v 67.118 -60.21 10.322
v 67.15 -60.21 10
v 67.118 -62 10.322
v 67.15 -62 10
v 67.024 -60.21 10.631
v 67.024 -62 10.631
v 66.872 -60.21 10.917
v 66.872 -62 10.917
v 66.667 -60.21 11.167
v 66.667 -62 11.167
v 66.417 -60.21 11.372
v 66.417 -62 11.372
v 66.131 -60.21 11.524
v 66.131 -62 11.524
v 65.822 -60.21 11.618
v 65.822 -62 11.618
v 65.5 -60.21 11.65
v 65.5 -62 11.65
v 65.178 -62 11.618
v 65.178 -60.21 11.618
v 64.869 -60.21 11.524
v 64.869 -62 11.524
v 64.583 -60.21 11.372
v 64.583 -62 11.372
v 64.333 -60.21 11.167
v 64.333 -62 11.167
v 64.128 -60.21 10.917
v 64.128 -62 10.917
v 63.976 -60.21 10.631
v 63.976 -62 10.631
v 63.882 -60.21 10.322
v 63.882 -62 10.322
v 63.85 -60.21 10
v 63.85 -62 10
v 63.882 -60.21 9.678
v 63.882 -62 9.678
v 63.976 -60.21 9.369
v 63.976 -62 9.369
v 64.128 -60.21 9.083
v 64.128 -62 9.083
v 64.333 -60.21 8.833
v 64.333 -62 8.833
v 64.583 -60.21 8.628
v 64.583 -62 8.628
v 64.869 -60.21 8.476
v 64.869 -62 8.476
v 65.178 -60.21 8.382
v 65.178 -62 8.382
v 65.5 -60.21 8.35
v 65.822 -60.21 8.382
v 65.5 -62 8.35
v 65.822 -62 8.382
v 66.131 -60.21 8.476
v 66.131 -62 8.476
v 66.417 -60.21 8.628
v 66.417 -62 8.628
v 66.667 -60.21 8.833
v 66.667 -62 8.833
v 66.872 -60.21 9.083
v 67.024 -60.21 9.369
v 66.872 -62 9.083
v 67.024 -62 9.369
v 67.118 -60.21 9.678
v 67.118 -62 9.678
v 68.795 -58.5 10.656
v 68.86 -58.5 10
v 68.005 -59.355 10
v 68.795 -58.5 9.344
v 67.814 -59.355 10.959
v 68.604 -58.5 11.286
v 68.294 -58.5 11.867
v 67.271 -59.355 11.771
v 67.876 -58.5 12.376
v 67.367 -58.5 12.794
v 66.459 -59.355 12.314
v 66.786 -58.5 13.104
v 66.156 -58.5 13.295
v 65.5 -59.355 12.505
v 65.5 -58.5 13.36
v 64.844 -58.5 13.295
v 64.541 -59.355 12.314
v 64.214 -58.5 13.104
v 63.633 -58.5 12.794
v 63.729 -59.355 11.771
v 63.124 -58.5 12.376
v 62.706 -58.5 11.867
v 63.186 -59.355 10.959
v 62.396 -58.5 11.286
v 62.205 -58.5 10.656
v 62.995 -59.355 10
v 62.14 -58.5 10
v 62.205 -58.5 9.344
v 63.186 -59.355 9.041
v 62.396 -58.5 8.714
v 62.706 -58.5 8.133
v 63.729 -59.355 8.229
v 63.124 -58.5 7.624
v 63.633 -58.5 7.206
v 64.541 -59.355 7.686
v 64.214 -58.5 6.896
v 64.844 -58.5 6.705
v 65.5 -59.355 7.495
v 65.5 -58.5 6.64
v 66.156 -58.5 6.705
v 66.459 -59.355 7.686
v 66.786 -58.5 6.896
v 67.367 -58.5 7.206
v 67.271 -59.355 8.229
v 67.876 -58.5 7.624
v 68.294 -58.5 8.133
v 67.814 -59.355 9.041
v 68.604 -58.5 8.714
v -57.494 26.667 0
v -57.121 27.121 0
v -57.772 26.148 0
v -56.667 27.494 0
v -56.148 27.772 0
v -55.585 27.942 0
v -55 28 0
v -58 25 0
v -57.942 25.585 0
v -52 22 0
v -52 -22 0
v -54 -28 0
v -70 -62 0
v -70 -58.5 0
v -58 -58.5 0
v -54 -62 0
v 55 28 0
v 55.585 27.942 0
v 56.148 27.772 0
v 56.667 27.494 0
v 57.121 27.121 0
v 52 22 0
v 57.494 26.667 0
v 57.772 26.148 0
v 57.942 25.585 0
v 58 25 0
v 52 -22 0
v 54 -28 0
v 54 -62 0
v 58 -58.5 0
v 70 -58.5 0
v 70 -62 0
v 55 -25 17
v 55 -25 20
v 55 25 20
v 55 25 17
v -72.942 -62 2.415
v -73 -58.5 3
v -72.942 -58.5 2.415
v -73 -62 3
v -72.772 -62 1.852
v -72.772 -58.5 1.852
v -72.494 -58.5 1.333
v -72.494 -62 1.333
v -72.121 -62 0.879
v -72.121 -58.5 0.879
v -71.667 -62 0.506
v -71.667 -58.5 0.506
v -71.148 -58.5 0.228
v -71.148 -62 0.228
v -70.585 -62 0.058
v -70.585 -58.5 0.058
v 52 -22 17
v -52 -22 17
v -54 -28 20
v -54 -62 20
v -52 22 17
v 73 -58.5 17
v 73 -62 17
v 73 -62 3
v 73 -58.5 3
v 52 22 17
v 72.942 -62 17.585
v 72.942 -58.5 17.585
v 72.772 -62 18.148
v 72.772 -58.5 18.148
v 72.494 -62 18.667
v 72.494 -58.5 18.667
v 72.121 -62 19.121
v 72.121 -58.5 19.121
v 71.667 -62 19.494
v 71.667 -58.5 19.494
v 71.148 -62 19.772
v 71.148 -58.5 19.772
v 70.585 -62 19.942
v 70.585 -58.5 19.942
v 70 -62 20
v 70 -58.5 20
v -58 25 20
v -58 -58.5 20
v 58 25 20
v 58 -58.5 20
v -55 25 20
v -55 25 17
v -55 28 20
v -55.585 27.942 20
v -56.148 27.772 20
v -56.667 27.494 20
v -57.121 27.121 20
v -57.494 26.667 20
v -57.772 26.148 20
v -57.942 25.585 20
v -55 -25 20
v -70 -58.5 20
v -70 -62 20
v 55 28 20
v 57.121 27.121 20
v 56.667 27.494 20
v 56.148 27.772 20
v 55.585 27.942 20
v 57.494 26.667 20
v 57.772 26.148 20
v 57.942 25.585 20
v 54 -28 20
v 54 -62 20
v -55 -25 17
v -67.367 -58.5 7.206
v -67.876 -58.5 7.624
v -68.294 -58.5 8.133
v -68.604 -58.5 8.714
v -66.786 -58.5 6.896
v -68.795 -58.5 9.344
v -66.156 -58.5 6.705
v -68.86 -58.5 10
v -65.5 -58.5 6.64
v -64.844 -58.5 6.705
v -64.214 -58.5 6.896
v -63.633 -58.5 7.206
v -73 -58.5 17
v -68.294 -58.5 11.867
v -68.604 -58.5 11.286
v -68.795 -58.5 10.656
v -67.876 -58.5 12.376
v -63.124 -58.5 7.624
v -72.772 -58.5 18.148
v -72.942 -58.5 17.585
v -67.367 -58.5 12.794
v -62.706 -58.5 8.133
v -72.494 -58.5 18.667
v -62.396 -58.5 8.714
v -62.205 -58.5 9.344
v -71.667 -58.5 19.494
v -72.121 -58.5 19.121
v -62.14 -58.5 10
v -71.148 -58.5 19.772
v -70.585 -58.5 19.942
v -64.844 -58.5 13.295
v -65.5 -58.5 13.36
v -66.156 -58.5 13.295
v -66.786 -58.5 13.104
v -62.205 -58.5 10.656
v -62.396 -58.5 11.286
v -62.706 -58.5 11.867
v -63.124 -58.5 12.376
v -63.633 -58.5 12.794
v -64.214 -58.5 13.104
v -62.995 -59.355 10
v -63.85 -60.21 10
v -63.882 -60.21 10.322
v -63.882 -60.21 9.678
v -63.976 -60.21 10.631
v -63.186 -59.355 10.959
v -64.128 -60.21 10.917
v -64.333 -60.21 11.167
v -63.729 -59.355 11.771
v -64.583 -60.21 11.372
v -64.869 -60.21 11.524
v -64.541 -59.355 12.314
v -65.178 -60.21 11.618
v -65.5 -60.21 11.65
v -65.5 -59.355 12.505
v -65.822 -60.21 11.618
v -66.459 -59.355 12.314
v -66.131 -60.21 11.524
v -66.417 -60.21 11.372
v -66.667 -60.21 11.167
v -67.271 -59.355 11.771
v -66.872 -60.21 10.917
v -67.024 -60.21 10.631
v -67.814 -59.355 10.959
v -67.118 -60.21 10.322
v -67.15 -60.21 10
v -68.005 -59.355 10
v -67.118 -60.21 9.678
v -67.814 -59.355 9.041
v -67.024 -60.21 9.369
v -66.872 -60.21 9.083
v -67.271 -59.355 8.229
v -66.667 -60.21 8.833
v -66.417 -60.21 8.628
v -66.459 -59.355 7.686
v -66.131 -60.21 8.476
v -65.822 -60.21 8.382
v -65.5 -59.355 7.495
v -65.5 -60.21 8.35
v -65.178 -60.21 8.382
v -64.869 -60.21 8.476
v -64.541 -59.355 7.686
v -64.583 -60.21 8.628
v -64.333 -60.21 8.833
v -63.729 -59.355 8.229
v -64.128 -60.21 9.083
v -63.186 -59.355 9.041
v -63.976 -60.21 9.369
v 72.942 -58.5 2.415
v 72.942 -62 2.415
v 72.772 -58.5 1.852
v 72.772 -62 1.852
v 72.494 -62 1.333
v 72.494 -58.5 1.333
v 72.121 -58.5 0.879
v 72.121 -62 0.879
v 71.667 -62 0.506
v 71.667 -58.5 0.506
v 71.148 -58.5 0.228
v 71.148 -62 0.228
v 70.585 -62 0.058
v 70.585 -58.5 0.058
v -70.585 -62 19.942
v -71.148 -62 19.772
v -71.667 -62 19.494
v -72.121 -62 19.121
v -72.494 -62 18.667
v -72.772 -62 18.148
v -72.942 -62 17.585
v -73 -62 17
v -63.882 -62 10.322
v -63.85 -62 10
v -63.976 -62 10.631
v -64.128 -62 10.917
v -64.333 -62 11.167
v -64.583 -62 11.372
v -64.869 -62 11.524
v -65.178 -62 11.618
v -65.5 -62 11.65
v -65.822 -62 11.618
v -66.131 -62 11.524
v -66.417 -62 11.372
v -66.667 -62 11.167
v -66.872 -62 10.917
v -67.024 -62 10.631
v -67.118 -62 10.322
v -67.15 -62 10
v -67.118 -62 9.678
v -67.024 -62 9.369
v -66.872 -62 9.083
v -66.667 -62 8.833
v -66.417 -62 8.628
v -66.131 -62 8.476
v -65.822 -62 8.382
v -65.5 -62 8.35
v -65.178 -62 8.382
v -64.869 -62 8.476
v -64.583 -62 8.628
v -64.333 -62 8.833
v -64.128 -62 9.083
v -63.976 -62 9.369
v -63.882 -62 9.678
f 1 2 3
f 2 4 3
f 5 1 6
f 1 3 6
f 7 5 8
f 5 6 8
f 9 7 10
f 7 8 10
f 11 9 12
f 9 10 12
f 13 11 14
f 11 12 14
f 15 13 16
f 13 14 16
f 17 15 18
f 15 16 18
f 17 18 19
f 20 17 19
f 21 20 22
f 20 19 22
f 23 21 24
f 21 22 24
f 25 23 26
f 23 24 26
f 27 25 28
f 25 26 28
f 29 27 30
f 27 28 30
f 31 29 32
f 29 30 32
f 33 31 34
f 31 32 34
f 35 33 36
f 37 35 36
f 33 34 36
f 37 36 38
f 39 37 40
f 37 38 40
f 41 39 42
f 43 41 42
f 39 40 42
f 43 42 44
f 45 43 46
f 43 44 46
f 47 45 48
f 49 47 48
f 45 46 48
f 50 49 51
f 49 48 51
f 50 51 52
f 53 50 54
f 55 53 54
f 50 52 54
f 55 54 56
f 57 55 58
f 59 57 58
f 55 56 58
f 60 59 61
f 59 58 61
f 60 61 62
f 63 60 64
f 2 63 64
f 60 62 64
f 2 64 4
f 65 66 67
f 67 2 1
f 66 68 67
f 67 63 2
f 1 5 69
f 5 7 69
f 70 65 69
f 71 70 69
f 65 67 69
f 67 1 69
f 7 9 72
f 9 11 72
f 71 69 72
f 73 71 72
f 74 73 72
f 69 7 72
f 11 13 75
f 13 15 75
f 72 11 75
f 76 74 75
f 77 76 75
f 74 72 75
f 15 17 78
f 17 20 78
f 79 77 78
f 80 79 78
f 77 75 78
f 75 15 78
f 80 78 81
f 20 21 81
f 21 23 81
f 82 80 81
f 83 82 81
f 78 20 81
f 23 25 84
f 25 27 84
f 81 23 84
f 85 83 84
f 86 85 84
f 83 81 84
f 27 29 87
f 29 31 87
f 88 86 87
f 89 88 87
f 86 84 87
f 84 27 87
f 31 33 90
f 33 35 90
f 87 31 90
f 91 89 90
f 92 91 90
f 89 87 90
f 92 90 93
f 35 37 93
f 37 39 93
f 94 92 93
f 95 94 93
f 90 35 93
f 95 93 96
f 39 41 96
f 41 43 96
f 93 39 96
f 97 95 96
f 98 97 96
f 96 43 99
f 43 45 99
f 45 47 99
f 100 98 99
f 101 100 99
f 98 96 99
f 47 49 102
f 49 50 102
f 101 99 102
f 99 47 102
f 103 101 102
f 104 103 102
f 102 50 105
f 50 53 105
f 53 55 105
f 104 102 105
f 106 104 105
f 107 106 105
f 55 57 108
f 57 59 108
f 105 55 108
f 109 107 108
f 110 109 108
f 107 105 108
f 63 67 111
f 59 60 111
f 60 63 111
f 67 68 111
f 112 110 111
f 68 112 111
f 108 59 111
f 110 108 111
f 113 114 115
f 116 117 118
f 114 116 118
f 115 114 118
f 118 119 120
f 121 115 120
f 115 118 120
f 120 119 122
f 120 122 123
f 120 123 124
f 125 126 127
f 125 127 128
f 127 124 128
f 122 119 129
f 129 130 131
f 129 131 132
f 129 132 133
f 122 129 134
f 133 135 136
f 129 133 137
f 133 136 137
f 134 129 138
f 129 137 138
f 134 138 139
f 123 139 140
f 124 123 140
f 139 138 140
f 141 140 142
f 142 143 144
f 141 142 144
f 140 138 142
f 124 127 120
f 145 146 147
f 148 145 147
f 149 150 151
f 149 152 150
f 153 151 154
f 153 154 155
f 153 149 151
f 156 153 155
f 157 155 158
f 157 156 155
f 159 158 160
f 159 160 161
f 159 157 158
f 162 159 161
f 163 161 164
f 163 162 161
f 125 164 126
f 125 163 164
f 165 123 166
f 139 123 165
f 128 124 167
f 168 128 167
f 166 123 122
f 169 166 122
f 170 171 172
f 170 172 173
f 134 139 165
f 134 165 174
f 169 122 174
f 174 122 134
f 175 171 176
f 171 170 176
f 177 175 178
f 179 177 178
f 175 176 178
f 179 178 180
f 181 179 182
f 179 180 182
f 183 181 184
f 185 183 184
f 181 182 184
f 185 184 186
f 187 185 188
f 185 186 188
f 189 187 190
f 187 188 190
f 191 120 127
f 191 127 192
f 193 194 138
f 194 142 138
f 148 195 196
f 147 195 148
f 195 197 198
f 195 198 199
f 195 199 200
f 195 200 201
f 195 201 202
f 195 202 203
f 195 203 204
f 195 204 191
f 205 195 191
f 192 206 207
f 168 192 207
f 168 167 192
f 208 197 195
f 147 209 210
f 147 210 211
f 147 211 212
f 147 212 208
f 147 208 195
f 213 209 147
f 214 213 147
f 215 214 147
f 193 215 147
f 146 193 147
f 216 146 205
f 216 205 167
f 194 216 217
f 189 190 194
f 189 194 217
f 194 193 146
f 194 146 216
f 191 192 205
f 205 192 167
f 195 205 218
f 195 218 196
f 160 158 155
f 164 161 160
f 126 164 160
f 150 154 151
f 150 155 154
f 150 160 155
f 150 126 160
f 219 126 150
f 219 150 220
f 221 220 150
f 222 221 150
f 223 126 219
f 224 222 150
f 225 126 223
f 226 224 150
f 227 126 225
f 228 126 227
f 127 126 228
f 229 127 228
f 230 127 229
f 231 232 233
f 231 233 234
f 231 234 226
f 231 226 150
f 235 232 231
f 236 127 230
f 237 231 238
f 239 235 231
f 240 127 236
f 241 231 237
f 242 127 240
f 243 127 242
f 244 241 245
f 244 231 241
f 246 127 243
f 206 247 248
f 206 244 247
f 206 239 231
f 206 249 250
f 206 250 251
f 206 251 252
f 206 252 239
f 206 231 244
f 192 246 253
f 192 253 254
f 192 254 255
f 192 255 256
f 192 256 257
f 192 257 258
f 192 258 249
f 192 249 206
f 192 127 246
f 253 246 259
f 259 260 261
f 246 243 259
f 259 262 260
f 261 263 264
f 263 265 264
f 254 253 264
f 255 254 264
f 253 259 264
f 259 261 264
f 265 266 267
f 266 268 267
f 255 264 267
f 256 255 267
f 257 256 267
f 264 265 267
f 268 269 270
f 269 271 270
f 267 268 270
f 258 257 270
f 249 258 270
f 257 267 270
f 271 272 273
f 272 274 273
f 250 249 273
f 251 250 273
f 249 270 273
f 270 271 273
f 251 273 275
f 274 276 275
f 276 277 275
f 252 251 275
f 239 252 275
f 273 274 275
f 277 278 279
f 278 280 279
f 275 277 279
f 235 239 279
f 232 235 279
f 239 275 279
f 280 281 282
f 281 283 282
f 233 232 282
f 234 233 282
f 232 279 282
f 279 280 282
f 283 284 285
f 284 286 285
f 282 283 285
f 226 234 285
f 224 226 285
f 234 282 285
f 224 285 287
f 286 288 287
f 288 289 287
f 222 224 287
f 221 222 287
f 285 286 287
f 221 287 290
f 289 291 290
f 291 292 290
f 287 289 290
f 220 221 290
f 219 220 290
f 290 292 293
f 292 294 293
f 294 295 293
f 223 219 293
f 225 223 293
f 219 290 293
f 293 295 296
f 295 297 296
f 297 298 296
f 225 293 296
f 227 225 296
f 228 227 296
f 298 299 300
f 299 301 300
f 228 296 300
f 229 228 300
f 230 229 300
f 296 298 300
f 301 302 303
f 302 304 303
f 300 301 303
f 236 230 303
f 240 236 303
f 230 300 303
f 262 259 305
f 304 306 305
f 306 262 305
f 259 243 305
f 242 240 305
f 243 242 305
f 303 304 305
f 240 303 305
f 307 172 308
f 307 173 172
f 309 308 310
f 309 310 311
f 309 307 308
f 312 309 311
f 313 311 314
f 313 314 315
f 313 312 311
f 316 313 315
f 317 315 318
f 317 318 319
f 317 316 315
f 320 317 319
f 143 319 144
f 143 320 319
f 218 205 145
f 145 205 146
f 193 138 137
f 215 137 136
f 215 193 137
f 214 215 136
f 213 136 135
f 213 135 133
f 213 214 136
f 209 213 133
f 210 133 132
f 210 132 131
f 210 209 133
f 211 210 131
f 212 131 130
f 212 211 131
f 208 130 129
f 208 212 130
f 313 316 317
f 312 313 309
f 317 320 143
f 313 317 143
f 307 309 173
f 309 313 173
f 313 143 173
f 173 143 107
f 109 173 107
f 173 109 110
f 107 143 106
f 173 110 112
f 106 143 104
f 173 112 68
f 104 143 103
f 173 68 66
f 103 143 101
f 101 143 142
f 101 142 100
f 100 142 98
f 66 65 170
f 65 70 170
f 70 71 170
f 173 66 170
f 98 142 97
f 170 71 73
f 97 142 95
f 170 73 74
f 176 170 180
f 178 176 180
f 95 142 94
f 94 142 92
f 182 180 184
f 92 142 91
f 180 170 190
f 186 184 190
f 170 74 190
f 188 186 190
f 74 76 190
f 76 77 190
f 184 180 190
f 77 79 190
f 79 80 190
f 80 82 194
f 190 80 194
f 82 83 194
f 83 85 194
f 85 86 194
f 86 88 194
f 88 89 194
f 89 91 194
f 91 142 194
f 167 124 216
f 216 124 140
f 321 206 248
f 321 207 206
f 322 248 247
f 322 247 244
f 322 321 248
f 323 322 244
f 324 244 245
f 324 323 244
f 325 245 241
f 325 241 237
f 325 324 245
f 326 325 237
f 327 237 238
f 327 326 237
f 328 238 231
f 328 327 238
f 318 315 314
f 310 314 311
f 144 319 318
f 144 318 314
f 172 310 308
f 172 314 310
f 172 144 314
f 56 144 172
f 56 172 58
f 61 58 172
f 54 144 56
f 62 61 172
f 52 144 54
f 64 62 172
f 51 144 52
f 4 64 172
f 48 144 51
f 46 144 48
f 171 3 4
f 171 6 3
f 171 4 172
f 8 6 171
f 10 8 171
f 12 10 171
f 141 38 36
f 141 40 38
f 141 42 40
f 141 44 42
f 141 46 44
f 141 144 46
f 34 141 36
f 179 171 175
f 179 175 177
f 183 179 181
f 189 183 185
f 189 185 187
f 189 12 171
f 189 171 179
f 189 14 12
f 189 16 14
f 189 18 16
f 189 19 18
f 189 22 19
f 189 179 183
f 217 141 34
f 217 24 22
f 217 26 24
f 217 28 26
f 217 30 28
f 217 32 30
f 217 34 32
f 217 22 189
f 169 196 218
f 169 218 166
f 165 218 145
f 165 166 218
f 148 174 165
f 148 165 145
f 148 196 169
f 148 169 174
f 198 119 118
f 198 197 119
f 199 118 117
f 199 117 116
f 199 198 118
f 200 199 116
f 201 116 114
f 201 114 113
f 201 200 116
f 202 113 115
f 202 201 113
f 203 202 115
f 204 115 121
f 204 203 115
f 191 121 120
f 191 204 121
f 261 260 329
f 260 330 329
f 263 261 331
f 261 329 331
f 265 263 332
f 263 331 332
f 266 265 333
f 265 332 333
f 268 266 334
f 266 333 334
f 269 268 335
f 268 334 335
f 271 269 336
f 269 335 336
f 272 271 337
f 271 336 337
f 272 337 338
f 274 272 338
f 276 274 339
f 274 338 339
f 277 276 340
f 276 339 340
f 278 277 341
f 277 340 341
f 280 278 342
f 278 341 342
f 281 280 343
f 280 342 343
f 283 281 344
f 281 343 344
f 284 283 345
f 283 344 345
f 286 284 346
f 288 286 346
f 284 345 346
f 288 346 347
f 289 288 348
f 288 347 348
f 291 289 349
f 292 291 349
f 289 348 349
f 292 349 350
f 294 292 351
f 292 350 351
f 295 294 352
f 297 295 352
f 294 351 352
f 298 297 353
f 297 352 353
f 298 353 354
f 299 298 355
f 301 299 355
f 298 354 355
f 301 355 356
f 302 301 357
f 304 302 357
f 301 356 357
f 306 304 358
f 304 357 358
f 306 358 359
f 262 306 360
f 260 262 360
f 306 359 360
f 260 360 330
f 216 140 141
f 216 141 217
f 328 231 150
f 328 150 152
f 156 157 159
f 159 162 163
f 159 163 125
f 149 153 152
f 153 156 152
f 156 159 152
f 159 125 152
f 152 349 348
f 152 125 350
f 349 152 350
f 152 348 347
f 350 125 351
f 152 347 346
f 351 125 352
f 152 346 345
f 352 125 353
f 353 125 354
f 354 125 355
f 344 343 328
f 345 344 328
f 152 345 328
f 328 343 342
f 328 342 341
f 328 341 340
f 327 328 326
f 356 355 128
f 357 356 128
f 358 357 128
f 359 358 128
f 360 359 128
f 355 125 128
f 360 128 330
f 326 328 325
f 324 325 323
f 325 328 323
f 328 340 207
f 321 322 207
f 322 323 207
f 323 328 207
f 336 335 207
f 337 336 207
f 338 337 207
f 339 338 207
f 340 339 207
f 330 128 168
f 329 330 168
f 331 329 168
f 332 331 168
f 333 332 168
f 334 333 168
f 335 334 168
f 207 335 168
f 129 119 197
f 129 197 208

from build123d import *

# Parameters (mm, degrees)
F0_W            = 116
F0_H            = 56
F0_W_2          = 104
F0_H_2          = 44
F1_DEPTH        = 20
F2_W            = 110
F2_H            = 50
F2_W_2          = 104
F2_H_2          = 44
F3_DEPTH        = 3
F4_W            = 4
F4_H            = 20
F5_DEPTH        = 34
F6_W            = 3.5
F6_H            = 20
F7_DEPTH        = 15
F8_W            = 3.5
F8_H            = 20
F9_DEPTH        = 15
F11_D           = 3.3
F11_DEPTH       = 5
F11_CSINK_D     = 6.72
F11_CSINK_ANGLE = 90
F11_TIP         = 0.9914200214
F13_D           = 3.3
F13_DEPTH       = 5
F13_CSINK_D     = 6.72
F13_CSINK_ANGLE = 90
F13_TIP         = 0.9914200214
F14_R           = 3


with BuildPart() as f1:
    # F0 (on Top) → F1 (new body)
    with BuildSketch(Plane.XY):
        Rectangle(F0_W, F0_H)
        Rectangle(F0_W_2, F0_H_2, mode=Mode.SUBTRACT)
    extrude(amount=F1_DEPTH)

    # F2 (on face) → F3 (cut)
    with BuildSketch(Plane.XY.offset(20)):
        Rectangle(F2_W, F2_H)
        Rectangle(F2_W_2, F2_H_2, mode=Mode.SUBTRACT)
    extrude(amount=-F3_DEPTH, mode=Mode.SUBTRACT)

    # F4 (on face) → F5 (join)
    with BuildSketch(Plane.XZ.offset(28)):
        with Locations((-56, 10)):
            Rectangle(F4_W, F4_H)
        with Locations((56, 10)):
            Rectangle(F4_W, F4_H)
    extrude(amount=F5_DEPTH)

    # F6 (on face) → F7 (join)
    with BuildSketch(Plane.YZ.offset(58)):
        with Locations((-60.25, 10)):
            Rectangle(F6_W, F6_H)
    extrude(amount=F7_DEPTH)

    # F8 (on face) → F9 (join)
    with BuildSketch(Plane(origin=(-58, 0, 0), x_dir=(0, -1, 0), z_dir=(-1, 0, 0))):
        with Locations((60.25, 10)):
            Rectangle(F8_W, F8_H)
    extrude(amount=F9_DEPTH)

    # F11
    with Locations(Plane(origin=(0, -58.5, 0), x_dir=(-1, 0, 0), z_dir=(0, 1, 0))):
        with Locations((-65.5, 10)):
            CounterSinkHole(F11_D / 2, F11_CSINK_D / 2, depth=F11_DEPTH, counter_sink_angle=F11_CSINK_ANGLE)
            with Locations((0, 0, -(F11_DEPTH + F11_TIP / 2))):  # 118° drill point
                Cone(0, F11_D / 2, F11_TIP, mode=Mode.SUBTRACT)

    # F13
    with Locations(Plane(origin=(0, -58.5, 0), x_dir=(-1, 0, 0), z_dir=(0, 1, 0))):
        with Locations((65.5, 10)):
            CounterSinkHole(F13_D / 2, F13_CSINK_D / 2, depth=F13_DEPTH, counter_sink_angle=F13_CSINK_ANGLE)
            with Locations((0, 0, -(F13_DEPTH + F13_TIP / 2))):  # 118° drill point
                Cone(0, F13_D / 2, F13_TIP, mode=Mode.SUBTRACT)

    # F14
    f14_edges = [f1.edges().sort_by_distance(p)[0] for p in [
        (58, 28, 10),
        (-58, 28, 10),
        (73, -60.25, 0),
        (73, -60.25, 20),
        (-73, -60.25, 20),
        (-73, -60.25, 0),
    ]]
    fillet(f14_edges, radius=F14_R)


solid = f1.part
